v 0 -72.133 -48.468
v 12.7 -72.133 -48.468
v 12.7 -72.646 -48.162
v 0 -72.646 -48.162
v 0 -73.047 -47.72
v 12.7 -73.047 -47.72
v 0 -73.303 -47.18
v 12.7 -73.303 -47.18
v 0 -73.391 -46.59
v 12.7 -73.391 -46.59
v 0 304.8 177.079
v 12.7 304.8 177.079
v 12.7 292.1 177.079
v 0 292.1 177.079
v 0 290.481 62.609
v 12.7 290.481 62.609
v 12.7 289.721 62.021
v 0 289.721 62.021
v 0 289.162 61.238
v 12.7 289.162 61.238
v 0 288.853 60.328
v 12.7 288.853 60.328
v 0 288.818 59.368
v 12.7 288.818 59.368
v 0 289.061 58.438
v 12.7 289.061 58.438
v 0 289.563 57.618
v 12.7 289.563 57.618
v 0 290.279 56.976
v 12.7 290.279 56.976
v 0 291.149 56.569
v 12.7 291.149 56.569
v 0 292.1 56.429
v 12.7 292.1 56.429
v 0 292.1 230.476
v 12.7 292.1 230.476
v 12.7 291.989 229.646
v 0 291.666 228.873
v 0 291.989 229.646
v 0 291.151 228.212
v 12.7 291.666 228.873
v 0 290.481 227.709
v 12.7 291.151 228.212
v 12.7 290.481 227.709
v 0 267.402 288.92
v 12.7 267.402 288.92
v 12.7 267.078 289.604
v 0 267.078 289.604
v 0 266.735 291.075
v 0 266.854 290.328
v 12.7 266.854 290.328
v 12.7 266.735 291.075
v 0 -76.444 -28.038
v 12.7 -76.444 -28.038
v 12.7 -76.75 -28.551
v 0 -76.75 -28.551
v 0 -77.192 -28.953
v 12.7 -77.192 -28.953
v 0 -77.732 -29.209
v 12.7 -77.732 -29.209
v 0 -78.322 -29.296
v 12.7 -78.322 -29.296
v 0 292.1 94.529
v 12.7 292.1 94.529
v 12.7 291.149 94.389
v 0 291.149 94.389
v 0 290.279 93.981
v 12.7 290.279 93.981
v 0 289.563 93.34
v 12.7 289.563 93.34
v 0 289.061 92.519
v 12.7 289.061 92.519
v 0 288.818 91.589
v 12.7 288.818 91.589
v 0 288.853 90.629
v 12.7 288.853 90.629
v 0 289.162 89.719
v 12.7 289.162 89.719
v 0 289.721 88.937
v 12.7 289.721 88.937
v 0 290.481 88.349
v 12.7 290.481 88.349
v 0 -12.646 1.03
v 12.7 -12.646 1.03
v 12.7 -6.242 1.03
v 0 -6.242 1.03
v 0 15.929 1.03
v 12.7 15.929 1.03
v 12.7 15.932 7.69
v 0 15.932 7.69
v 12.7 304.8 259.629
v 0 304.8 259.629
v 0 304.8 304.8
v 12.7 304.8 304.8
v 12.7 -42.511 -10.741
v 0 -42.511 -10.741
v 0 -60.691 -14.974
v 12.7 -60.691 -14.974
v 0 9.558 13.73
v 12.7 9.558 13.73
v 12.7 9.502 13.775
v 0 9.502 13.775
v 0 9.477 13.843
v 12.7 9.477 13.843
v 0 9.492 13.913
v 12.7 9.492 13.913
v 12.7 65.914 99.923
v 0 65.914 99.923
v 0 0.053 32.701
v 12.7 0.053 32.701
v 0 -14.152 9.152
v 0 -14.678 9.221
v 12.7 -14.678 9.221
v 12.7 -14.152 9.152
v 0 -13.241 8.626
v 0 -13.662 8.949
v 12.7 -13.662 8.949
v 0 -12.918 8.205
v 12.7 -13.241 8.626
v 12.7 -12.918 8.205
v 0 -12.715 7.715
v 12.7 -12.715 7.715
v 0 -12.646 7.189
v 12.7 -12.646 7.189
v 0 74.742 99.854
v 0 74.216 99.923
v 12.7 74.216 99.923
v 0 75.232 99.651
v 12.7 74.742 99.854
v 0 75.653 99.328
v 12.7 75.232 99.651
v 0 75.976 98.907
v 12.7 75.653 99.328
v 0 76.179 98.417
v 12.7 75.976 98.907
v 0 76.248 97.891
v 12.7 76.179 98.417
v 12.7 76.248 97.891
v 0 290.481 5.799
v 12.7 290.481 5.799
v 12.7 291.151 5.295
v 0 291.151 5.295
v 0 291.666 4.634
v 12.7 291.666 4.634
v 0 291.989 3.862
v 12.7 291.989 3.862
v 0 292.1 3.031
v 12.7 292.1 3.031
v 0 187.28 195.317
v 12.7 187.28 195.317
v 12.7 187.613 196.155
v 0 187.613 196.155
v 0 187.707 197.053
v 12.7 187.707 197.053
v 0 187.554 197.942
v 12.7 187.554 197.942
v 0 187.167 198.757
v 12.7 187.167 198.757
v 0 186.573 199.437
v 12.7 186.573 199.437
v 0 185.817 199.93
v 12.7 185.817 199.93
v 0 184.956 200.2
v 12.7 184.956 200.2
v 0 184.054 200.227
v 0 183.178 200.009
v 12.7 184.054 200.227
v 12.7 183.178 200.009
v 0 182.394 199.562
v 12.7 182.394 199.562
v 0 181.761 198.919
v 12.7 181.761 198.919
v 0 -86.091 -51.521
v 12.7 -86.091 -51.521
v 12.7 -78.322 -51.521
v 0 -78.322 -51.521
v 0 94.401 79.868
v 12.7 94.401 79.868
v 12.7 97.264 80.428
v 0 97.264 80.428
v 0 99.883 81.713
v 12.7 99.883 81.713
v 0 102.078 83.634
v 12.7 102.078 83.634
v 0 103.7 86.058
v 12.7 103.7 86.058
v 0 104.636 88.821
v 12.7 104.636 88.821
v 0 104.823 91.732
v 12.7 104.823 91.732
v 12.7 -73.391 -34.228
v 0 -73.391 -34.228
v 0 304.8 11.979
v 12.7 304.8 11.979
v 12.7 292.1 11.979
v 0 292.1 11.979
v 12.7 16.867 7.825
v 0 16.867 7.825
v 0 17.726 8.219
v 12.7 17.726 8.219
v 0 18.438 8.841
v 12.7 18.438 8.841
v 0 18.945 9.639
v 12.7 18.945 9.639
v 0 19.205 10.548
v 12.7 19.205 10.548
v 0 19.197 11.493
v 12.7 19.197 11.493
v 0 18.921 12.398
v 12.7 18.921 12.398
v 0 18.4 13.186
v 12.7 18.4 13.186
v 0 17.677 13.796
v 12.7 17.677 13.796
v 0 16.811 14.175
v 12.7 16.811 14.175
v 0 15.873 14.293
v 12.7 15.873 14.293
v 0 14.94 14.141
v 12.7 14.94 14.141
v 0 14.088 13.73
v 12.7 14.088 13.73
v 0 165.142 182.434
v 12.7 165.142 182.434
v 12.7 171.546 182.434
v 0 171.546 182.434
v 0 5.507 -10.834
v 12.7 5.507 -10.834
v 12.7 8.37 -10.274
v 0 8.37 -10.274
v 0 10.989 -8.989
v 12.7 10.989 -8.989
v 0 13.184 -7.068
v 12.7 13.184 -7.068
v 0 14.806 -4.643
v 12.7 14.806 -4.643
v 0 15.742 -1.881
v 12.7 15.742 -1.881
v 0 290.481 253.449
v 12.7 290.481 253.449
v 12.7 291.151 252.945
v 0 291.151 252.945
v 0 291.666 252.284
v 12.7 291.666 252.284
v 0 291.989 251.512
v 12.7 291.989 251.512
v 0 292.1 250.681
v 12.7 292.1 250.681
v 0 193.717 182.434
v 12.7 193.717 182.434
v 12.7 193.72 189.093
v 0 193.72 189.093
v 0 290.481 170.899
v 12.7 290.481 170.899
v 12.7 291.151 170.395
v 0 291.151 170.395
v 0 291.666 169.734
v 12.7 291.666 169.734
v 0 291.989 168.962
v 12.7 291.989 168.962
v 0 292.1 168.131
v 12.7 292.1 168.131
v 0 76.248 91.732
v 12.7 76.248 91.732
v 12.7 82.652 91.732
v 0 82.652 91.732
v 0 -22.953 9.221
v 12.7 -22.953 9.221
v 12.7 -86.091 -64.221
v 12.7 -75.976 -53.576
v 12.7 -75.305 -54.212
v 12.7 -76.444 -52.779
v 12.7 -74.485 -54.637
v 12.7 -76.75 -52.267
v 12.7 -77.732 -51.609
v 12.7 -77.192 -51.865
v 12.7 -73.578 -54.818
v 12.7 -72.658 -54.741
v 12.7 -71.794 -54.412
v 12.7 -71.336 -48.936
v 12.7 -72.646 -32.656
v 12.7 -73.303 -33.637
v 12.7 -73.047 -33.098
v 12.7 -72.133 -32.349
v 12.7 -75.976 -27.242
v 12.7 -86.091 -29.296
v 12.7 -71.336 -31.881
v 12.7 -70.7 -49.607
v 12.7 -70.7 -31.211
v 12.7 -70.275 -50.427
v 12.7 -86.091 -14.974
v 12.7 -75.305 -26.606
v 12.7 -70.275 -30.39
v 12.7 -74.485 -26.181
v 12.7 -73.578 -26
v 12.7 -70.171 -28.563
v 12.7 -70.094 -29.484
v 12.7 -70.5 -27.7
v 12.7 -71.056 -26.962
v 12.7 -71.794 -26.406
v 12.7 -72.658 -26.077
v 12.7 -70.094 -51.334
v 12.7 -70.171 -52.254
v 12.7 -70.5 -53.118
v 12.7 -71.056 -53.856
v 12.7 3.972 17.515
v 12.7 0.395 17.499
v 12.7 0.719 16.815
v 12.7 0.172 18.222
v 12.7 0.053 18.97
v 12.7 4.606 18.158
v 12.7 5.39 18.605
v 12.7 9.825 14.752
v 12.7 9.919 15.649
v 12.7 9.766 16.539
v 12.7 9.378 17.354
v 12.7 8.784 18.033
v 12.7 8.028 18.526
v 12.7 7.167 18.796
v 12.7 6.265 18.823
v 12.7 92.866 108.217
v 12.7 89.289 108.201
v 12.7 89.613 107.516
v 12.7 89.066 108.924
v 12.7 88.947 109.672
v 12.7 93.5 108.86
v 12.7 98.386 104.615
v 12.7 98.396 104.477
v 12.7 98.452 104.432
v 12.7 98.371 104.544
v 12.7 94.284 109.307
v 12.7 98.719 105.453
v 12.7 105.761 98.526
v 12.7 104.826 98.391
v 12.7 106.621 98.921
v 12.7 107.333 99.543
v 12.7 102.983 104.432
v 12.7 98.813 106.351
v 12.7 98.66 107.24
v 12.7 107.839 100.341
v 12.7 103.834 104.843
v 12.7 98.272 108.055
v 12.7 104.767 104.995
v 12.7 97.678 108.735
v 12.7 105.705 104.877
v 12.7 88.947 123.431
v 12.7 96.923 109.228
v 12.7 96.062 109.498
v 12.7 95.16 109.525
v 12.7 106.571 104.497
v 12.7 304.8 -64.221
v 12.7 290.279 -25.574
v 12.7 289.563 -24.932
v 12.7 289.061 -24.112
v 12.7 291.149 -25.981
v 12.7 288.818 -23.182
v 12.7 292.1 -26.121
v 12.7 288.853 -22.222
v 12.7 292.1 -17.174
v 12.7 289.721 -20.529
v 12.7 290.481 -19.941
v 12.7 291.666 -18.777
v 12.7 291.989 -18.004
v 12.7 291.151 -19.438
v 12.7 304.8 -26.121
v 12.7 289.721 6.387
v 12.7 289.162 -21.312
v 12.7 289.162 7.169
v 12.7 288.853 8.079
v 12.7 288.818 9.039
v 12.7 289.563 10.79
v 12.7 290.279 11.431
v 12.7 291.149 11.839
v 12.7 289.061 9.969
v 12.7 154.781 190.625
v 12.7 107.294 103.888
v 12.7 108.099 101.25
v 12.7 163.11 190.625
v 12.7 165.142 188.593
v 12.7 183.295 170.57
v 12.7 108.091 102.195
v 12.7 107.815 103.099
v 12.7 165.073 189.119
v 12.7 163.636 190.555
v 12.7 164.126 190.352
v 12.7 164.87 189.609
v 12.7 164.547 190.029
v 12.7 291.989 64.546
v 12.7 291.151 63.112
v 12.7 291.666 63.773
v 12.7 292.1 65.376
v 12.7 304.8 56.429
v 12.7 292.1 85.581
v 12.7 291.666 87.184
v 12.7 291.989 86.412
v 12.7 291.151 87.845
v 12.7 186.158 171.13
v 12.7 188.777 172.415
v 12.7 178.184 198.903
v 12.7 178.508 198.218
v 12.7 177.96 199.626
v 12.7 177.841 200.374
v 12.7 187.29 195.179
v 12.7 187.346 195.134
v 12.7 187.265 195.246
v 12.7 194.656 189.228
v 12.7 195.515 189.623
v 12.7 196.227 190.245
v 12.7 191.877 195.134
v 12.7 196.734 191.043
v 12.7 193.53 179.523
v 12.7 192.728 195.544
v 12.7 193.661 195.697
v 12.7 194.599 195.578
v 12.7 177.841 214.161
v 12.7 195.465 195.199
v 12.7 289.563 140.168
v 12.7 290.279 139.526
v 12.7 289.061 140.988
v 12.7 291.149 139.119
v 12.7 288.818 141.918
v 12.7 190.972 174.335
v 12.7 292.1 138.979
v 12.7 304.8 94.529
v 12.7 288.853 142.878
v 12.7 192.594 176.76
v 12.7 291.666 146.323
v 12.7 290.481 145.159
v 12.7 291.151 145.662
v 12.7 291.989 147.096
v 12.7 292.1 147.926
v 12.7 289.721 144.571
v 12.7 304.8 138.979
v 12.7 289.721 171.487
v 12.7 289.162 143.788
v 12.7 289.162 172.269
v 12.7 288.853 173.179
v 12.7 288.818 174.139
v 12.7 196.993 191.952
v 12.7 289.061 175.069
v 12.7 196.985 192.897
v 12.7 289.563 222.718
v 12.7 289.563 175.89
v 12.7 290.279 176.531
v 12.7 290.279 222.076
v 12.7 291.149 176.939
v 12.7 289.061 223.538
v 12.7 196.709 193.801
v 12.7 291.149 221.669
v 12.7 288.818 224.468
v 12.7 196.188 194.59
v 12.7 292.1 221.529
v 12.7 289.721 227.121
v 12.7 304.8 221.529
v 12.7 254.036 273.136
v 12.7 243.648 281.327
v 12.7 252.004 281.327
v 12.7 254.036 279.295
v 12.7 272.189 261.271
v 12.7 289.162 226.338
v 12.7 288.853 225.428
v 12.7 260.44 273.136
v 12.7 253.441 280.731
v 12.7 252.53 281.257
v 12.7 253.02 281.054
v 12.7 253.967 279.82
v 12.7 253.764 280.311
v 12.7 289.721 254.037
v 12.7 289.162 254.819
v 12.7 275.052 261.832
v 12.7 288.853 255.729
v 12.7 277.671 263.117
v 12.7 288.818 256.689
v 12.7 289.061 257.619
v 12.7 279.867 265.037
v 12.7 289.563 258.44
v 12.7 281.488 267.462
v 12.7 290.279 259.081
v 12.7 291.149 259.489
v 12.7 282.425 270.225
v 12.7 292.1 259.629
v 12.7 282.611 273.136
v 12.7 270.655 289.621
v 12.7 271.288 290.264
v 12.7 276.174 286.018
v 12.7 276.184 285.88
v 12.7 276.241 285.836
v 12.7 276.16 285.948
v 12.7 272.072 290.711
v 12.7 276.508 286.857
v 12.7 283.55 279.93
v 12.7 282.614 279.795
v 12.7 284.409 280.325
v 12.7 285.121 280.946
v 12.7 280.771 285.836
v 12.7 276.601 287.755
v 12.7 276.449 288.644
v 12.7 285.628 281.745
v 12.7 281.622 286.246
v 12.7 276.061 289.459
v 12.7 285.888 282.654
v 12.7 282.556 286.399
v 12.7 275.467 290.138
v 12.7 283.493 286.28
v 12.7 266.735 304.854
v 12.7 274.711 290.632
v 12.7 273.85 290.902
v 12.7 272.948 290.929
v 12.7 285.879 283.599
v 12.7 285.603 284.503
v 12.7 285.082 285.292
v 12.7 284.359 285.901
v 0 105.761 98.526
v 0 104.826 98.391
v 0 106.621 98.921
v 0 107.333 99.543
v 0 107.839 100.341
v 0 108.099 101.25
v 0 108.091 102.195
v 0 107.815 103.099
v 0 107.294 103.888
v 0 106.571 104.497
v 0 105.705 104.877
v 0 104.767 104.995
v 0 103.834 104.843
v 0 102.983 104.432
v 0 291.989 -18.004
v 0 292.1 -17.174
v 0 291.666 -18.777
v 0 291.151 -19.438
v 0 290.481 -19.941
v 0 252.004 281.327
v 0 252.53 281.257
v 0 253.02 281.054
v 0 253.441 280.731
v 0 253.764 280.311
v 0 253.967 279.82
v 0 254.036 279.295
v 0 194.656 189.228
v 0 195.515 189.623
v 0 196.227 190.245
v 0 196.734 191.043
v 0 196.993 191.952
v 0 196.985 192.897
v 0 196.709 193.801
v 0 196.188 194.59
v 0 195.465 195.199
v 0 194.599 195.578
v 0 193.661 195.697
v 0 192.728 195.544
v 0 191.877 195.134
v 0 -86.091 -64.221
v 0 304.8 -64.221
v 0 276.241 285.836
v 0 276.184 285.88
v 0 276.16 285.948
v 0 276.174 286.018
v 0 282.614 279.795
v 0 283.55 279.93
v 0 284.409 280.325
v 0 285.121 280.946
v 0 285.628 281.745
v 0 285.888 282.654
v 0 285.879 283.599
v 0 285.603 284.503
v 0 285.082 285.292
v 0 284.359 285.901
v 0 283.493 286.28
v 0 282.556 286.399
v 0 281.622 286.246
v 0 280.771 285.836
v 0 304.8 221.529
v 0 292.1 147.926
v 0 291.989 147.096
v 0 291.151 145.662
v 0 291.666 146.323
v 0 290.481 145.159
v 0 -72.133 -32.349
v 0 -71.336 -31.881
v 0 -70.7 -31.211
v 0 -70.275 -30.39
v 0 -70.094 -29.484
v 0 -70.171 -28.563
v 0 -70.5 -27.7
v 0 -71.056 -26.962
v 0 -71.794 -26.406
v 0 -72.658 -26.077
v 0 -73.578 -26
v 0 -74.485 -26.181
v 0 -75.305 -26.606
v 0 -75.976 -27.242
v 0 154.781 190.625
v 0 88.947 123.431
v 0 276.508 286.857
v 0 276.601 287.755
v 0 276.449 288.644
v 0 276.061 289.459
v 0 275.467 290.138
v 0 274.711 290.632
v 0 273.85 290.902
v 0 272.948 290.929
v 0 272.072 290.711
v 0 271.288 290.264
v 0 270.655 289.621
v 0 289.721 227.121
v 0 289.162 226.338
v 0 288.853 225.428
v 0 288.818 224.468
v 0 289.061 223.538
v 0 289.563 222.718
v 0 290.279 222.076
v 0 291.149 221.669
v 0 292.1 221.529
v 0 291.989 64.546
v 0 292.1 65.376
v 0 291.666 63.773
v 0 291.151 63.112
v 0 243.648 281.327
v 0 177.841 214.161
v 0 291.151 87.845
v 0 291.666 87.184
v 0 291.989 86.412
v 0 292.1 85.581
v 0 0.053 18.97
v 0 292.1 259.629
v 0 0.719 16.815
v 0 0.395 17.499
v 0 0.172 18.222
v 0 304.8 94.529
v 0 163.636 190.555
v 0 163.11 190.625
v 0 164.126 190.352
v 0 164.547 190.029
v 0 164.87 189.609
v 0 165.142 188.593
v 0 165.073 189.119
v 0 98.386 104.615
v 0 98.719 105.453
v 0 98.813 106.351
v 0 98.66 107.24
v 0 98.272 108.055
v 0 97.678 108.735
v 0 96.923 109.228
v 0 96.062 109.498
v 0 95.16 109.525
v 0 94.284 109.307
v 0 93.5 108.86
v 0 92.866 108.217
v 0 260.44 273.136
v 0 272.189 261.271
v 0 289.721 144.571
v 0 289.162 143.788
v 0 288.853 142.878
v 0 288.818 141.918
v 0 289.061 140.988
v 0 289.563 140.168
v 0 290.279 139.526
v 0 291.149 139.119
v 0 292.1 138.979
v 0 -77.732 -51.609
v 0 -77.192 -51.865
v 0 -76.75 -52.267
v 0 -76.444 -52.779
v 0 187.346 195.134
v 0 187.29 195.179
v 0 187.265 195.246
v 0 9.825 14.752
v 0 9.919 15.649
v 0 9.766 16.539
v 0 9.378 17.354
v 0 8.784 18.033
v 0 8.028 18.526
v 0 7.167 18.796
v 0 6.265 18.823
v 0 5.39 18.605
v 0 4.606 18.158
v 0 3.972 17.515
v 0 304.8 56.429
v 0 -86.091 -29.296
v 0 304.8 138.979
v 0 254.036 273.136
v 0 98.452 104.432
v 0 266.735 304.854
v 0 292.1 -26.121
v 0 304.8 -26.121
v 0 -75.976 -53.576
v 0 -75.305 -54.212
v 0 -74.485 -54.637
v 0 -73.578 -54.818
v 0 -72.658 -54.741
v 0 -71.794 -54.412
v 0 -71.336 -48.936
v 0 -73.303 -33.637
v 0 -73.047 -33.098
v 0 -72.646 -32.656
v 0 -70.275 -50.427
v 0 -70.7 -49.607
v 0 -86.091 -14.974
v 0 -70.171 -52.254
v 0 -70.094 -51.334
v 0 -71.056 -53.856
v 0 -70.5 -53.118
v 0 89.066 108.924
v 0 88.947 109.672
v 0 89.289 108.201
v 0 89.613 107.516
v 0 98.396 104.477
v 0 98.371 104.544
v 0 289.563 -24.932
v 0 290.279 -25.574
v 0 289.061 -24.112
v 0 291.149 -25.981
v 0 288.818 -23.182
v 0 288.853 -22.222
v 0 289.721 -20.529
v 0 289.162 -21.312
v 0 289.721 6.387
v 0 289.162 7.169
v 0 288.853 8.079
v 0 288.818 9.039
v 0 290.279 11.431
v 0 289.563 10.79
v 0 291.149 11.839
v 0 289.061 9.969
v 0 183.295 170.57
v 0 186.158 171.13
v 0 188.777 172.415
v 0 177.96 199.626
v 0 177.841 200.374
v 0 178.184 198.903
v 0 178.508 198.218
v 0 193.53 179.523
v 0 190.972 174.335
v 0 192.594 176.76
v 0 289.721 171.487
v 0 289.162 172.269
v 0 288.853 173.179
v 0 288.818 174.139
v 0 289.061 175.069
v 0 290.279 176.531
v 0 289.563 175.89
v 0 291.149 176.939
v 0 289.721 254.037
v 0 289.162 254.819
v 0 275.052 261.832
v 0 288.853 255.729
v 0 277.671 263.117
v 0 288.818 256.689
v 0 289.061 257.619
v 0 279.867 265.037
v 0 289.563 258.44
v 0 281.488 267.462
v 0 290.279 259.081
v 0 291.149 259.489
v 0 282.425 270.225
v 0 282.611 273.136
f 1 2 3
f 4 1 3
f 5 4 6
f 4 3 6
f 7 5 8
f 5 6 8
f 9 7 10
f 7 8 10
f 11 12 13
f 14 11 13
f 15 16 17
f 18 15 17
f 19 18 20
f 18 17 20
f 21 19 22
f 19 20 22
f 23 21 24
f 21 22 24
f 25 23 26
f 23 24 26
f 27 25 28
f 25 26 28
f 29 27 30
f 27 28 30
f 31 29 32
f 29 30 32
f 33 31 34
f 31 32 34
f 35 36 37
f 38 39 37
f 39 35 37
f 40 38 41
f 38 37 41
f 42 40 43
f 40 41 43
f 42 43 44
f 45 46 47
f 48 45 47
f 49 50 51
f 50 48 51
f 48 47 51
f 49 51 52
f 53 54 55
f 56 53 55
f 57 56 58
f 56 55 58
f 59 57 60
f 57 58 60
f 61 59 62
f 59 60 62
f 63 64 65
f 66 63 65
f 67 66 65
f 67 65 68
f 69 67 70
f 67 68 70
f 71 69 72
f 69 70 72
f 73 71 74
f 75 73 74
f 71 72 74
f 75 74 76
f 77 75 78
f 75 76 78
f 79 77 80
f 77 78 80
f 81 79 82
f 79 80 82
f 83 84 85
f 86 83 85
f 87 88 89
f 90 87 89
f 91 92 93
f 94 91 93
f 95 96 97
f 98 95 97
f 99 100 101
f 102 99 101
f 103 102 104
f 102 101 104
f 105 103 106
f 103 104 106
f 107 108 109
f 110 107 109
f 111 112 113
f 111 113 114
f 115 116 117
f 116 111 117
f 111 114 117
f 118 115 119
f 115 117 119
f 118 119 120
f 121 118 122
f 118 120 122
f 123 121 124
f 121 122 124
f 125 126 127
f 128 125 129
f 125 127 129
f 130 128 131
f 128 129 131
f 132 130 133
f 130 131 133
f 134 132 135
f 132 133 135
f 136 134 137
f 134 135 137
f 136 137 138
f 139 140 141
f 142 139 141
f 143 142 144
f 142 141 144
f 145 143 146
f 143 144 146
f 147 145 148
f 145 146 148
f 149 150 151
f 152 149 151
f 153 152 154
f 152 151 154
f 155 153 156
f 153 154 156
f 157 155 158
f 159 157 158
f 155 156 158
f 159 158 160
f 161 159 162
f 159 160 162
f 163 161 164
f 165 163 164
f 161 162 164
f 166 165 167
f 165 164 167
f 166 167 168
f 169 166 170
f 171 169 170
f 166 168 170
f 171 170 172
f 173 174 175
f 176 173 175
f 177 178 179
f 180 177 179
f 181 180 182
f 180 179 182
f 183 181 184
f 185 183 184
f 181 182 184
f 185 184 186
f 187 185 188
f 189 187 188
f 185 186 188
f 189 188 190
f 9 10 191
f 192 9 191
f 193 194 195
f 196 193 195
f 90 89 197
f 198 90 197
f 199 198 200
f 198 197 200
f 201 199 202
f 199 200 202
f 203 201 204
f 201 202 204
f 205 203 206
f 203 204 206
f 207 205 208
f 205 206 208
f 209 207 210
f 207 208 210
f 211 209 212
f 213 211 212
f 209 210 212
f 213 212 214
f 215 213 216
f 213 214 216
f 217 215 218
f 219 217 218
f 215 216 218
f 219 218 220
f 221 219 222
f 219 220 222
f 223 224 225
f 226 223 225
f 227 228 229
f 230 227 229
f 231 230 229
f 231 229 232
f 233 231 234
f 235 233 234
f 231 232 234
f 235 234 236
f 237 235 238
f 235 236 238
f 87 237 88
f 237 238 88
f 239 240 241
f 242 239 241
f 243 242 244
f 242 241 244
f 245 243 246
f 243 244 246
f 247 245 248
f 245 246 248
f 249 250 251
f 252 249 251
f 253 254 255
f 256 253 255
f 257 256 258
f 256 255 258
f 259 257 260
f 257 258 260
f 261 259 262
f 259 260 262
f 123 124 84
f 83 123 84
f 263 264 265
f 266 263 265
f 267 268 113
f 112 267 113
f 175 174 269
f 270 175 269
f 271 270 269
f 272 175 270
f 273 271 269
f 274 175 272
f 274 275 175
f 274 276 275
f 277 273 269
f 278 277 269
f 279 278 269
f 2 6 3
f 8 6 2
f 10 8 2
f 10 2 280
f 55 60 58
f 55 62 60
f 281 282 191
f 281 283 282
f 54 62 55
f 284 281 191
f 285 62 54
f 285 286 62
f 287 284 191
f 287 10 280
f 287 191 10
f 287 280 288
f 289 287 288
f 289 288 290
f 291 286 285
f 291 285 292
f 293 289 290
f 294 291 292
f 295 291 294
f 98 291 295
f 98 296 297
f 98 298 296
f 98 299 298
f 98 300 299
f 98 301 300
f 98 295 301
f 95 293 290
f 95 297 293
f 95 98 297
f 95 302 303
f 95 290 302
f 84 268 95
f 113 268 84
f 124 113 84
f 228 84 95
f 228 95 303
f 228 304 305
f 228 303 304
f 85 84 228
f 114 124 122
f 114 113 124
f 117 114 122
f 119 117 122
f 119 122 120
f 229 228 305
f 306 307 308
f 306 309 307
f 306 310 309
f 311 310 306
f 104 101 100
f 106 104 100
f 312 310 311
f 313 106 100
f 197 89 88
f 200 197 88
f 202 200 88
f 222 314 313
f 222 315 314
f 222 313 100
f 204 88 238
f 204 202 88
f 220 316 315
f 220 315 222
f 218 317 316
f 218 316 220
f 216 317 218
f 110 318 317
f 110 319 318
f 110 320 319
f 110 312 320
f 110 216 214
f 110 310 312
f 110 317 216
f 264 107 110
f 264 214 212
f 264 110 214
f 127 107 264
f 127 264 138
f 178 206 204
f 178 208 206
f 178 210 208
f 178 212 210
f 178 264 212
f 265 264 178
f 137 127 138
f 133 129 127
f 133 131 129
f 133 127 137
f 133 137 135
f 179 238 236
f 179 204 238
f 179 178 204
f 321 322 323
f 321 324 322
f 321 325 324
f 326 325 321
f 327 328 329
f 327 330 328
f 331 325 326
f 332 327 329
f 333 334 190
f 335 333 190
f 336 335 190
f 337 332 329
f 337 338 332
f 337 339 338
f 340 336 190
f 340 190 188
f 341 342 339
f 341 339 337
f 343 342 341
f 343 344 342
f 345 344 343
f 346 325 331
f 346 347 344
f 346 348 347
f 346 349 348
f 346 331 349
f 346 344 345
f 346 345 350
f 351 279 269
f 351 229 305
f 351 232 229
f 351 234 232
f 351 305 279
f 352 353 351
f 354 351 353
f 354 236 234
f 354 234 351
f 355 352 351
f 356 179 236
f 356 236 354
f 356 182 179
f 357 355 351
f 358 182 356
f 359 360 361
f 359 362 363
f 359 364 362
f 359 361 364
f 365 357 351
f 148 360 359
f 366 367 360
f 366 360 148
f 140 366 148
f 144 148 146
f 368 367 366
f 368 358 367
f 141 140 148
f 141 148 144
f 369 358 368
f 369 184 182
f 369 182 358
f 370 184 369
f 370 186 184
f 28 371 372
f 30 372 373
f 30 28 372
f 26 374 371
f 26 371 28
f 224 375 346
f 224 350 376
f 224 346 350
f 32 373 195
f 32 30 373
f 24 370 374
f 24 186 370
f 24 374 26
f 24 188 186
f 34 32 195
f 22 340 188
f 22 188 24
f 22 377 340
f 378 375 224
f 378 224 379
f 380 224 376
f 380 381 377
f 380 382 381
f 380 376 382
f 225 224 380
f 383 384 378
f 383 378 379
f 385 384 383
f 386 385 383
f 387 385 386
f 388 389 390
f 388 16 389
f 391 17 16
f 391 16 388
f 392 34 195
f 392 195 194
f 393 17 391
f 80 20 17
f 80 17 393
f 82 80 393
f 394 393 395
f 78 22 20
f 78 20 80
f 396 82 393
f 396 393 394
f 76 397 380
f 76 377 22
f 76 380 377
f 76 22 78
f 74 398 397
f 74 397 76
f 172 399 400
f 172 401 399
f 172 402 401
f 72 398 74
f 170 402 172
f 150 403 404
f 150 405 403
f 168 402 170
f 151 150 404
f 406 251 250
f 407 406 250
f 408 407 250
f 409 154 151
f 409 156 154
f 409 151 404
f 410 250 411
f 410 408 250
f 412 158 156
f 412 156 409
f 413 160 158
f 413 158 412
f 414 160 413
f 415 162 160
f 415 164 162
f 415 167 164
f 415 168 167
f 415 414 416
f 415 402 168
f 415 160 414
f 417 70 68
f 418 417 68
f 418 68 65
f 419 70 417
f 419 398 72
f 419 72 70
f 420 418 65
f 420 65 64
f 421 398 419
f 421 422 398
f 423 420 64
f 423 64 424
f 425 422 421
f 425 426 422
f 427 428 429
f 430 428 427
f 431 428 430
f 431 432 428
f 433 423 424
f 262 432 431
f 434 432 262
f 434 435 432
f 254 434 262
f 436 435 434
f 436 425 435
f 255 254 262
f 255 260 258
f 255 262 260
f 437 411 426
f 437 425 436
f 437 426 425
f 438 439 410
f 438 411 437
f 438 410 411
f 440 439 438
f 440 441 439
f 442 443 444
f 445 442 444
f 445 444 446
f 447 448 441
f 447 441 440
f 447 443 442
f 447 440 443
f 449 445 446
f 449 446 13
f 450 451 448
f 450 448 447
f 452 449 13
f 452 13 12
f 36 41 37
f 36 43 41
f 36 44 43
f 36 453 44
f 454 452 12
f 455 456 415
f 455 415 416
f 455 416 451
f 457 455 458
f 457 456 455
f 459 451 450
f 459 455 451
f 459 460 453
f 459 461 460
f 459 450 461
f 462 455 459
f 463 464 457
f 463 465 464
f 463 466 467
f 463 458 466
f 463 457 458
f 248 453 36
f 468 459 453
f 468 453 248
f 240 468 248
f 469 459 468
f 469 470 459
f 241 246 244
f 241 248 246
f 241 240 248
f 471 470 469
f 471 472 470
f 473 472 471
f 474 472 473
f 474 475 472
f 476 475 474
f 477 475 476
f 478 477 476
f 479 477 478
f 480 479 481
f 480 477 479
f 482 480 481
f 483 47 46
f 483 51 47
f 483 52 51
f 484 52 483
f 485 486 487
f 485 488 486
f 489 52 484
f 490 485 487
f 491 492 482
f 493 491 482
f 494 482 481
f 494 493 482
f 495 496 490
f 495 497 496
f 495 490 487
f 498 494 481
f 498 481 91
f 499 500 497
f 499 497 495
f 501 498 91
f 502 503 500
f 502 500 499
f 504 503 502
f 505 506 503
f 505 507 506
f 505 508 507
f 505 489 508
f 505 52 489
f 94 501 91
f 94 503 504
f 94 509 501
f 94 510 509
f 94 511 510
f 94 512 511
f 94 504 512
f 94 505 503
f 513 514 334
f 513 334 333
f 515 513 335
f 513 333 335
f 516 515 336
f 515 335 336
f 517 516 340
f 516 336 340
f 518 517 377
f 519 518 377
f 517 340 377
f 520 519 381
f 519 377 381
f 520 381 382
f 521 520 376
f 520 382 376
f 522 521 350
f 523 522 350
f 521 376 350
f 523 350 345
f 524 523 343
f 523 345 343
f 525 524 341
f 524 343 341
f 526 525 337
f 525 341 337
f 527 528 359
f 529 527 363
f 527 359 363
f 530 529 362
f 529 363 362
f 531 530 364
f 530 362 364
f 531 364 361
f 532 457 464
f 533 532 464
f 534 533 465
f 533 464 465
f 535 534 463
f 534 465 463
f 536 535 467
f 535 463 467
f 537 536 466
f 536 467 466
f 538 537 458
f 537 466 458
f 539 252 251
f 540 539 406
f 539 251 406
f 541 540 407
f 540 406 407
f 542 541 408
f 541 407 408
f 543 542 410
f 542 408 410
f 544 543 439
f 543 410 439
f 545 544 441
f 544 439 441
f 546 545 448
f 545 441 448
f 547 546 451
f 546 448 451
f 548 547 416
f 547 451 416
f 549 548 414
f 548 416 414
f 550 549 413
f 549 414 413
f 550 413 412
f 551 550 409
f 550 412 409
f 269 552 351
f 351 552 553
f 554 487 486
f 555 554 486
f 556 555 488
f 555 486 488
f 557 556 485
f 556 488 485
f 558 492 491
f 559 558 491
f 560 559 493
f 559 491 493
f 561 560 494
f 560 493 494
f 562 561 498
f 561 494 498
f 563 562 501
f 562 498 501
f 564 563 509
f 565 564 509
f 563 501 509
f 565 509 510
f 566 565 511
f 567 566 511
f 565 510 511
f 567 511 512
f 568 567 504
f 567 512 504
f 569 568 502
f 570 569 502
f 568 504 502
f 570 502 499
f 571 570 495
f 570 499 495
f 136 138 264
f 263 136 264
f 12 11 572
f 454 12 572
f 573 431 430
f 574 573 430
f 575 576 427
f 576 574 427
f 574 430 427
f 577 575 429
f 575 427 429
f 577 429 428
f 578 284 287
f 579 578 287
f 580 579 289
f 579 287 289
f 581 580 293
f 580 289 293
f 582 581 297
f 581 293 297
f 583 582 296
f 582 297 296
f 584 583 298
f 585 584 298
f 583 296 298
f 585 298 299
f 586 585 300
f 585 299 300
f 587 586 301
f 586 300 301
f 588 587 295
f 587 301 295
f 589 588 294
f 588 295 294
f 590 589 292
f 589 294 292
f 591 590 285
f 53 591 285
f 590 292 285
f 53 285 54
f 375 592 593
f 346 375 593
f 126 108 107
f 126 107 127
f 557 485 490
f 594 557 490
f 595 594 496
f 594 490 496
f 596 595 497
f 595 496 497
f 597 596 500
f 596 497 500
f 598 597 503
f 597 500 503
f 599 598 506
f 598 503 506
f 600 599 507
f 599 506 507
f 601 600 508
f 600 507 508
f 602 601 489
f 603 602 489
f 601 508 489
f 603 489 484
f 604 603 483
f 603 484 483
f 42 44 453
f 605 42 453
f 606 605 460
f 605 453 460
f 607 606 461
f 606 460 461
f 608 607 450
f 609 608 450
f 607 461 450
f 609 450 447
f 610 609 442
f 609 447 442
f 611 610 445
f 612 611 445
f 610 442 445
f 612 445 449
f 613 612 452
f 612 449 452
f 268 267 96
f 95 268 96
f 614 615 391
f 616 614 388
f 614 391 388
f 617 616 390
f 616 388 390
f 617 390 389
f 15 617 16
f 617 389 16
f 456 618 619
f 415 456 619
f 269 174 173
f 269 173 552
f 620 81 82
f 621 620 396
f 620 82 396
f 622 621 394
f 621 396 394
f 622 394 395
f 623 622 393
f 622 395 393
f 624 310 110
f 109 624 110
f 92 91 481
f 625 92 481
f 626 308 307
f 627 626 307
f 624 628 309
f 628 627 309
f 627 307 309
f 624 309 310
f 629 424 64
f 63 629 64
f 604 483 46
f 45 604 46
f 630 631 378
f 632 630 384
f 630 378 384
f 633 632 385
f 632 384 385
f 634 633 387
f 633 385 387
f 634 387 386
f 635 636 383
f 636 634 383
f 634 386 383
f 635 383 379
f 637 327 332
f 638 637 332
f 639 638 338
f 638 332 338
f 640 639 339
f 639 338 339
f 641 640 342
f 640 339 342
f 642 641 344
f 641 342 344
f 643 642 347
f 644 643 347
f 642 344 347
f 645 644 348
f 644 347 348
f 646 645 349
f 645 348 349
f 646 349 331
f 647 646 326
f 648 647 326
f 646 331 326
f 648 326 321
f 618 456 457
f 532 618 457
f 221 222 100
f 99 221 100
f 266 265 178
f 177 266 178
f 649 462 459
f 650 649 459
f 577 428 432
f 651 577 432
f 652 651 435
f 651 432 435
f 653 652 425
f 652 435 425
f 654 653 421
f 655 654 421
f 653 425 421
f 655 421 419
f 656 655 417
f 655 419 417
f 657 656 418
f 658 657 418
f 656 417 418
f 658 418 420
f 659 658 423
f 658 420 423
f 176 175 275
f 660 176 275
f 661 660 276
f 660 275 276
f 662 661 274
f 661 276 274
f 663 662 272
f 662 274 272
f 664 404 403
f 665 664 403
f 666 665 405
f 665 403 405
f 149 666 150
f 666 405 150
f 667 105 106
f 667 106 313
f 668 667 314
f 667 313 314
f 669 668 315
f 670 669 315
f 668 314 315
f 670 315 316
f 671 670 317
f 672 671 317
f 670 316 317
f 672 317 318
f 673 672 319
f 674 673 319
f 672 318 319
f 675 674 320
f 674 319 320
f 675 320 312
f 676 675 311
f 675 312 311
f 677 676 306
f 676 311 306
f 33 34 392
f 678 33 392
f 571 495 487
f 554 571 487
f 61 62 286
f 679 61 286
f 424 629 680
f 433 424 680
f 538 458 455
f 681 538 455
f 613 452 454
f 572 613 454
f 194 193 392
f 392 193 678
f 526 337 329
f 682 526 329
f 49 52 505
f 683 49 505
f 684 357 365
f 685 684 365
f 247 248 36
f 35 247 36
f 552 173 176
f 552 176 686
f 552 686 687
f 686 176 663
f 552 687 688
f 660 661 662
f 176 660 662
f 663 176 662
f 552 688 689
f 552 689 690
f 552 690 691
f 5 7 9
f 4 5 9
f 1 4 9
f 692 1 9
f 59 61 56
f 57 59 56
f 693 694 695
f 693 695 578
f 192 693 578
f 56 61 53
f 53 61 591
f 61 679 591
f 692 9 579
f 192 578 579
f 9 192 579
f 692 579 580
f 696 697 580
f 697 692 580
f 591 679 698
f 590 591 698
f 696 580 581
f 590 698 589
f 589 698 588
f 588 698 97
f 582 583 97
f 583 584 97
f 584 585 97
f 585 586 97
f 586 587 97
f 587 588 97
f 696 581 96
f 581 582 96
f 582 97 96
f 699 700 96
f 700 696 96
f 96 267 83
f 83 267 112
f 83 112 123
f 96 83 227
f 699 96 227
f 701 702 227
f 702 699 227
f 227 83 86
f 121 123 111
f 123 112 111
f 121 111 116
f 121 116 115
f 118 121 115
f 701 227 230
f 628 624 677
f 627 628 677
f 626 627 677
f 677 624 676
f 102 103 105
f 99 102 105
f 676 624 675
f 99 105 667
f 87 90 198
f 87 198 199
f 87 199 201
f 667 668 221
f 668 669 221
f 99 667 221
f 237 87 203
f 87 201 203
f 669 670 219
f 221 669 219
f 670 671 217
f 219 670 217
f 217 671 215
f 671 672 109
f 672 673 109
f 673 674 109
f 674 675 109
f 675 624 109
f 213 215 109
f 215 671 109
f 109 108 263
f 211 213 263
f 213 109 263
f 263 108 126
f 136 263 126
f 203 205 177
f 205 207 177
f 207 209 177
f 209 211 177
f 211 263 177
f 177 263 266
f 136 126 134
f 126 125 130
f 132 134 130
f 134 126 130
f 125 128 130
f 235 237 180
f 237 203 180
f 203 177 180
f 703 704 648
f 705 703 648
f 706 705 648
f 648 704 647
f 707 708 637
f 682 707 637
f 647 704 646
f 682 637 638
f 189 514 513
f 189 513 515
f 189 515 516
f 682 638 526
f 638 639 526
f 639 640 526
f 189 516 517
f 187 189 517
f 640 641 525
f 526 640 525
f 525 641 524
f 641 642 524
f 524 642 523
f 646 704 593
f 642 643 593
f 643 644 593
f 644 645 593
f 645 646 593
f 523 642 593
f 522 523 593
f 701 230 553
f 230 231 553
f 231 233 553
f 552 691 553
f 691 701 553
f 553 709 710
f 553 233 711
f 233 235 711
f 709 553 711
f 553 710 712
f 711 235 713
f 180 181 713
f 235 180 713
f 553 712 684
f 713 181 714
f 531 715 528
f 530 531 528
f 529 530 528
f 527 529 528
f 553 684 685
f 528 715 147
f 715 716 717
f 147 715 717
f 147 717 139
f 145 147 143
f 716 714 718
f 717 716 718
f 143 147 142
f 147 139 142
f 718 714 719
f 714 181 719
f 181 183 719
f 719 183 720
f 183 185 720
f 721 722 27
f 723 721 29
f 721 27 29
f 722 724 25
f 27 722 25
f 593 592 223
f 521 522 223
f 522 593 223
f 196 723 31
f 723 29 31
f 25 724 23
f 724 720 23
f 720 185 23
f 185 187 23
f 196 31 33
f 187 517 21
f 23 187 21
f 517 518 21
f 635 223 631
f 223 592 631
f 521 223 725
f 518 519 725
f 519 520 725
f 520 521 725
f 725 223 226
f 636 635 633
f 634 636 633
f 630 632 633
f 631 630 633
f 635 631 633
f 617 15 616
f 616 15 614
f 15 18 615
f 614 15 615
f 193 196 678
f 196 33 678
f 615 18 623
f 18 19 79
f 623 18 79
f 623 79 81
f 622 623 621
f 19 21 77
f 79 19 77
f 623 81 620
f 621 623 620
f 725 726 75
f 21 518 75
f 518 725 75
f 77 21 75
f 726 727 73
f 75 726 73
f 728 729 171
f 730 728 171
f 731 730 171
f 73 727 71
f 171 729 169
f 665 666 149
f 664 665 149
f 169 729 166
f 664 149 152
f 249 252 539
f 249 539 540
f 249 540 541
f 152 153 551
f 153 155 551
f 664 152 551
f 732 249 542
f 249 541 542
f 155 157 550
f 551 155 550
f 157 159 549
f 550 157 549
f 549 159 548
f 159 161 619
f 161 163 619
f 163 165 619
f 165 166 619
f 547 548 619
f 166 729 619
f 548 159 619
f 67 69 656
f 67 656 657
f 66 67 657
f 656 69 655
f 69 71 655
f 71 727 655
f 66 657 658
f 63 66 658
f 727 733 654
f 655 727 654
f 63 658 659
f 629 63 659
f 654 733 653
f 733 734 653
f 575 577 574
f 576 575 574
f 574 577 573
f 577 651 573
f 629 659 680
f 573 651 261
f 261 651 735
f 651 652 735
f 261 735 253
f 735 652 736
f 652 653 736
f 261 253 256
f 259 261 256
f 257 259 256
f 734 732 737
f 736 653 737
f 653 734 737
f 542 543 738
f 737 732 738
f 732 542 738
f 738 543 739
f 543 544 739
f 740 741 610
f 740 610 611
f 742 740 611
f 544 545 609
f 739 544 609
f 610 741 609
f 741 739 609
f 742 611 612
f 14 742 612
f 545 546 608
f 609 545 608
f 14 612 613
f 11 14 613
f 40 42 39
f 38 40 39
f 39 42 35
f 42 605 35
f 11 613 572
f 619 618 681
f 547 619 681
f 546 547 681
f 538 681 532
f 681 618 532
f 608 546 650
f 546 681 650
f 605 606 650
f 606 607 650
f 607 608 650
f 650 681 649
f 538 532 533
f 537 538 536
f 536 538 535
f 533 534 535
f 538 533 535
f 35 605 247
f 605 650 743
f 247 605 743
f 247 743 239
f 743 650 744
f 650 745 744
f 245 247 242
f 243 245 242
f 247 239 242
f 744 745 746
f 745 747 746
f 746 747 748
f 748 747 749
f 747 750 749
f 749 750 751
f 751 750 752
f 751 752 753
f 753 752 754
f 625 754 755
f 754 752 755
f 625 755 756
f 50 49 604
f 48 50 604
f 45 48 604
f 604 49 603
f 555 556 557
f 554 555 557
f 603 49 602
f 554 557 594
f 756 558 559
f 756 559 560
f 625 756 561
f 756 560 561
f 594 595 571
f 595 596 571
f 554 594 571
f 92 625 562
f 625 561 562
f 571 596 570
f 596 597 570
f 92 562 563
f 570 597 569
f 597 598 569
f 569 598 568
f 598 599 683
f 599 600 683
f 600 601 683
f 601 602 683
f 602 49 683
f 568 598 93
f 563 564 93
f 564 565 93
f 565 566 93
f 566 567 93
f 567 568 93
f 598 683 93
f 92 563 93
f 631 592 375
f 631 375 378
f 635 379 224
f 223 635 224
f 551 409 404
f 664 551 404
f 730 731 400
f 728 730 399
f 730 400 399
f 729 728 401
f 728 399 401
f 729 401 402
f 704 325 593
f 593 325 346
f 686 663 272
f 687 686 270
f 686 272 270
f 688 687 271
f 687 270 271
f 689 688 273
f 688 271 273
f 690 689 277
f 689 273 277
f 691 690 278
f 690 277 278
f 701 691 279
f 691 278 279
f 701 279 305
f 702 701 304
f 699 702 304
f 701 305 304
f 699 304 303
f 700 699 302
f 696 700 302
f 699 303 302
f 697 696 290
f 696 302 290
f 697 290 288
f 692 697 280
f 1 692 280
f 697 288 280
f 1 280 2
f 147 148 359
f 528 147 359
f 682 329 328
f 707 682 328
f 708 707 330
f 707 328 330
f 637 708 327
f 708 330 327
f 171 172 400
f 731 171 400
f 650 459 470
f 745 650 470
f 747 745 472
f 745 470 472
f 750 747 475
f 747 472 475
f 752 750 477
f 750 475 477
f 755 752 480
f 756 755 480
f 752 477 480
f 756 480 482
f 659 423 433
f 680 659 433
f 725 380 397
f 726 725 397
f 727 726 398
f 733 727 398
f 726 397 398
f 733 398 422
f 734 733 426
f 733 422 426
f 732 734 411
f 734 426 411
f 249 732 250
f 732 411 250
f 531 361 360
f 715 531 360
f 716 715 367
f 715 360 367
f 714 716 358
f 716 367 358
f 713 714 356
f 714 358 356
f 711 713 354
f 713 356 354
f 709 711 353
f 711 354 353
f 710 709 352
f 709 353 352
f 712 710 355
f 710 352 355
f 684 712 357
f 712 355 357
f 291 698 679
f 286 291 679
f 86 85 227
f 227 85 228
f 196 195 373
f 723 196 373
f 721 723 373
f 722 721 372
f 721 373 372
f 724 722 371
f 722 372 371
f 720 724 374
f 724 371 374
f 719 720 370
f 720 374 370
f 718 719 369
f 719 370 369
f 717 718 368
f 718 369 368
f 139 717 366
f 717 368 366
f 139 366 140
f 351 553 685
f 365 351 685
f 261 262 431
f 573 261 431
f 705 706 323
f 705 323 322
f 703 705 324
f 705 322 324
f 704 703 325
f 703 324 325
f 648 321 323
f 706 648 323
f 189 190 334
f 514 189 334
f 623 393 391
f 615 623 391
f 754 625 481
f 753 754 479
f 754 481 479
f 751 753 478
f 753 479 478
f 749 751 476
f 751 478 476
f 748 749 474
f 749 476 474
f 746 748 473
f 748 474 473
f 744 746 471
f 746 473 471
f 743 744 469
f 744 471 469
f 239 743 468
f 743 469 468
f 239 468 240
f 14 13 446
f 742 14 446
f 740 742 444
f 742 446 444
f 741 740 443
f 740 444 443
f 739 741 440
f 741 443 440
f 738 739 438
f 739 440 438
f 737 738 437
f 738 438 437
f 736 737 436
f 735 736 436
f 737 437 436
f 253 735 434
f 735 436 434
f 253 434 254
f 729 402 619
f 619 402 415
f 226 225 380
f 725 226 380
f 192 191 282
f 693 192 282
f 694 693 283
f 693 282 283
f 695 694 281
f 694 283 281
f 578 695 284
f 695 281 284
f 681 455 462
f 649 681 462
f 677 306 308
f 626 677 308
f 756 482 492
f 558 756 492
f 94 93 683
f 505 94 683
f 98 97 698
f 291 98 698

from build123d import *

# Parameters (mm, degrees)
F1_DEPTH = 12.7
F2_DEPTH = 12.7
F4_DEPTH = 25.4
F6_DEPTH = 25.4
F8_DEPTH = 25.4


with BuildPart() as f1:
    # F0 (on Right) → F1 (new body)
    with BuildSketch(Plane.YZ):
        Polygon((304.799962, -64.221394), (304.799962, 304.800038), (266.7, 304.85419), (-42.510699, -10.741028), (-60.690689, -14.973944), (-60.690689, -19.789347), (-60.690689, -29.296394), (-60.690689, -64.221394), align=None)
        Polygon((-86.090689, -64.221394), (-60.690689, -64.221394), (-60.690689, -29.296394), (-60.690689, -19.789347), (-60.690689, -14.973944), (-86.090689, -14.973944), align=None)
    extrude(amount=F1_DEPTH)

    # F0 (on Right) → F2 (join)
    with BuildSketch(Plane.YZ):
        Polygon((304.799962, -64.221394), (304.799962, 304.800038), (266.7, 304.85419), (-42.510699, -10.741028), (-60.690689, -14.973944), (-60.690689, -19.789347), (-60.690689, -29.296394), (-60.690689, -64.221394), align=None)
        Polygon((-86.090689, -64.221394), (-60.690689, -64.221394), (-60.690689, -29.296394), (-60.690689, -19.789347), (-60.690689, -14.973944), (-86.090689, -14.973944), align=None)
    extrude(amount=F2_DEPTH)

    # F3 (on face) → F4 (cut)
    with BuildSketch(Plane.YZ.offset(12.7)):
        with BuildLine():
            Line((260.440068, 273.135901), (272.189458, 261.271445))
            ThreePointArc((272.189458, 261.271445), (279.866661, 265.037294), (282.611404, 273.135901))
            Line((282.611404, 273.135901), (282.614132, 279.79518))
            ThreePointArc((282.614132, 279.79518), (285.773725, 284.060884), (280.770869, 285.835901))
            Line((280.770869, 285.835901), (276.240647, 285.835901))
            ThreePointArc((276.240647, 285.835901), (276.167259, 285.912573), (276.174208, 286.018478))
            ThreePointArc((276.174208, 286.018478), (275.105821, 290.411047), (270.654796, 289.620796))
            Line((270.654796, 289.620796), (267.401841, 288.920168))
            ThreePointArc((267.401841, 288.920168), (266.952991, 289.962034), (266.735415, 291.075412))
            Line((266.735415, 291.075412), (266.735415, 304.926464))
            Line((266.735415, 304.926464), (243.648279, 281.326502))
            Line((243.648279, 281.326502), (252.004404, 281.326502))
            ThreePointArc((252.004404, 281.326502), (253.441245, 280.731343), (254.036404, 279.294502))
            Line((254.036404, 279.294502), (254.036404, 273.135901))
            Line((254.036404, 273.135901), (260.440068, 273.135901))
        make_face()
        with BuildLine():
            Line((177.841234, 200.373568), (177.841234, 214.224619))
            Line((177.841234, 214.224619), (154.754098, 190.624658))
            Line((154.754098, 190.624658), (163.110223, 190.624658))
            ThreePointArc((163.110223, 190.624658), (164.547063, 190.029499), (165.142223, 188.592658))
            Line((165.142223, 188.592658), (165.142223, 182.434057))
            Line((165.142223, 182.434057), (171.545887, 182.434057))
            Line((171.545887, 182.434057), (183.295277, 170.569601))
            ThreePointArc((183.295277, 170.569601), (190.972479, 174.33545), (193.717223, 182.434057))
            Line((193.717223, 182.434057), (193.719951, 189.093336))
            ThreePointArc((193.719951, 189.093336), (196.879544, 193.35904), (191.876687, 195.134057))
            Line((191.876687, 195.134057), (187.346465, 195.134057))
            ThreePointArc((187.346465, 195.134057), (187.273078, 195.210729), (187.280027, 195.316634))
            ThreePointArc((187.280027, 195.316634), (186.211639, 199.709203), (181.760615, 198.918952))
            Line((181.760615, 198.918952), (178.507659, 198.218324))
            ThreePointArc((178.507659, 198.218324), (178.05881, 199.26019), (177.841234, 200.373568))
        make_face()
        with BuildLine():
            Line((88.947052, 109.671724), (88.947052, 123.522775))
            Line((88.947052, 123.522775), (65.859917, 99.922814))
            Line((65.859917, 99.922814), (74.216041, 99.922814))
            ThreePointArc((74.216041, 99.922814), (75.652882, 99.327655), (76.248041, 97.890814))
            Line((76.248041, 97.890814), (76.248041, 91.732213))
            Line((76.248041, 91.732213), (82.651706, 91.732213))
            Line((82.651706, 91.732213), (94.401095, 79.867757))
            ThreePointArc((94.401095, 79.867757), (102.078298, 83.633606), (104.823041, 91.732213))
            Line((104.823041, 91.732213), (104.82577, 98.391492))
            ThreePointArc((104.82577, 98.391492), (107.985362, 102.657196), (102.982506, 104.432213))
            Line((102.982506, 104.432213), (98.452284, 104.432213))
            ThreePointArc((98.452284, 104.432213), (98.378896, 104.508885), (98.385845, 104.61479))
            ThreePointArc((98.385845, 104.61479), (97.317458, 109.007359), (92.866434, 108.217108))
            Line((92.866434, 108.217108), (89.613478, 107.51648))
            ThreePointArc((89.613478, 107.51648), (89.164628, 108.558346), (88.947052, 109.671724))
        make_face()
        with BuildLine():
            Line((0.052871, 18.96988), (0.052871, 32.820931))
            Line((0.052871, 32.820931), (-23.034265, 9.22097))
            Line((-23.034265, 9.22097), (-14.67814, 9.22097))
            ThreePointArc((-14.67814, 9.22097), (-13.241299, 8.625811), (-12.64614, 7.18897))
            Line((-12.64614, 7.18897), (-12.64614, 1.030369))
            Line((-12.64614, 1.030369), (-6.242476, 1.030369))
            Line((-6.242476, 1.030369), (5.506914, -10.834087))
            ThreePointArc((5.506914, -10.834087), (13.184117, -7.068238), (15.92886, 1.030369))
            Line((15.92886, 1.030369), (15.931588, 7.689648))
            ThreePointArc((15.931588, 7.689648), (19.091181, 11.955352), (14.088325, 13.730369))
            Line((14.088325, 13.730369), (9.558103, 13.730369))
            ThreePointArc((9.558103, 13.730369), (9.484715, 13.80704), (9.491664, 13.912946))
            ThreePointArc((9.491664, 13.912946), (8.423277, 18.305515), (3.972252, 17.515264))
            Line((3.972252, 17.515264), (0.719297, 16.814636))
            ThreePointArc((0.719297, 16.814636), (0.270447, 17.856502), (0.052871, 18.96988))
        make_face()
    extrude(amount=-F4_DEPTH, mode=Mode.SUBTRACT)

    # F5 (on face) → F6 (cut)
    with BuildSketch(Plane.YZ.offset(12.7)):
        with BuildLine():
            Line((292.099962, -26.121394), (304.799962, -26.121394))
            Line((304.799962, -26.121394), (304.799962, 11.978606))
            Line((304.799962, 11.978606), (292.099962, 11.978606))
            ThreePointArc((292.099962, 11.978606), (288.905703, 9.513217), (290.481334, 5.798542))
            ThreePointArc((290.481334, 5.798542), (291.665592, 4.634162), (292.099962, 3.031173))
            Line((292.099962, 3.031173), (292.099962, -17.173962))
            ThreePointArc((292.099962, -17.173962), (291.665592, -18.77695), (290.481334, -19.941331))
            ThreePointArc((290.481334, -19.941331), (288.905703, -23.656006), (292.099962, -26.121394))
        make_face()
        with BuildLine():
            Line((304.799962, 94.528606), (292.099962, 94.528606))
            ThreePointArc((292.099962, 94.528606), (288.905703, 92.063217), (290.481334, 88.348542))
            ThreePointArc((290.481334, 88.348542), (291.665592, 87.184162), (292.099962, 85.581173))
            Line((292.099962, 85.581173), (292.099962, 65.376038))
            ThreePointArc((292.099962, 65.376038), (291.665592, 63.77305), (290.481334, 62.608669))
            ThreePointArc((290.481334, 62.608669), (288.905703, 58.893994), (292.099962, 56.428606))
            Line((292.099962, 56.428606), (304.799962, 56.428606))
            Line((304.799962, 56.428606), (304.799962, 94.528606))
        make_face()
        with BuildLine():
            Line((304.799962, 177.078606), (292.099962, 177.078606))
            ThreePointArc((292.099962, 177.078606), (288.905703, 174.613217), (290.481334, 170.898542))
            ThreePointArc((290.481334, 170.898542), (291.665592, 169.734162), (292.099962, 168.131173))
            Line((292.099962, 168.131173), (292.099962, 147.926038))
            ThreePointArc((292.099962, 147.926038), (291.665592, 146.32305), (290.481334, 145.158669))
            ThreePointArc((290.481334, 145.158669), (288.905703, 141.443994), (292.099962, 138.978606))
            Line((292.099962, 138.978606), (304.799962, 138.978606))
            Line((304.799962, 138.978606), (304.799962, 177.078606))
        make_face()
        with BuildLine():
            Line((304.799962, 259.628606), (292.099962, 259.628606))
            ThreePointArc((292.099962, 259.628606), (288.905703, 257.163217), (290.481334, 253.448542))
            ThreePointArc((290.481334, 253.448542), (291.665592, 252.284162), (292.099962, 250.681173))
            Line((292.099962, 250.681173), (292.099962, 230.476038))
            ThreePointArc((292.099962, 230.476038), (291.665592, 228.87305), (290.481334, 227.708669))
            ThreePointArc((290.481334, 227.708669), (288.905703, 223.993994), (292.099962, 221.528606))
            Line((292.099962, 221.528606), (304.799962, 221.528606))
            Line((304.799962, 221.528606), (304.799962, 259.628606))
        make_face()
    extrude(amount=-F6_DEPTH, mode=Mode.SUBTRACT)

    # F7 (on face) → F8 (cut)
    with BuildSketch(Plane.YZ.offset(12.7)):
        with BuildLine():
            Line((-78.322477, -29.296394), (-86.090689, -29.296394))
            Line((-86.090689, -29.296394), (-86.090689, -51.521394))
            Line((-86.090689, -51.521394), (-78.322477, -51.521394))
            ThreePointArc((-78.322477, -51.521394), (-77.191976, -51.864906), (-76.4437, -52.779299))
            ThreePointArc((-76.4437, -52.779299), (-71.055822, -53.856261), (-72.132784, -48.468383))
            ThreePointArc((-72.132784, -48.468383), (-73.047177, -47.720107), (-73.390689, -46.589606))
            Line((-73.390689, -46.589606), (-73.390689, -34.228182))
            ThreePointArc((-73.390689, -34.228182), (-73.047177, -33.097682), (-72.132784, -32.349406))
            ThreePointArc((-72.132784, -32.349406), (-71.055822, -26.961528), (-76.4437, -28.03849))
            ThreePointArc((-76.4437, -28.03849), (-77.191976, -28.952883), (-78.322477, -29.296394))
        make_face()
    extrude(amount=-F8_DEPTH, mode=Mode.SUBTRACT)


solid = f1.part
